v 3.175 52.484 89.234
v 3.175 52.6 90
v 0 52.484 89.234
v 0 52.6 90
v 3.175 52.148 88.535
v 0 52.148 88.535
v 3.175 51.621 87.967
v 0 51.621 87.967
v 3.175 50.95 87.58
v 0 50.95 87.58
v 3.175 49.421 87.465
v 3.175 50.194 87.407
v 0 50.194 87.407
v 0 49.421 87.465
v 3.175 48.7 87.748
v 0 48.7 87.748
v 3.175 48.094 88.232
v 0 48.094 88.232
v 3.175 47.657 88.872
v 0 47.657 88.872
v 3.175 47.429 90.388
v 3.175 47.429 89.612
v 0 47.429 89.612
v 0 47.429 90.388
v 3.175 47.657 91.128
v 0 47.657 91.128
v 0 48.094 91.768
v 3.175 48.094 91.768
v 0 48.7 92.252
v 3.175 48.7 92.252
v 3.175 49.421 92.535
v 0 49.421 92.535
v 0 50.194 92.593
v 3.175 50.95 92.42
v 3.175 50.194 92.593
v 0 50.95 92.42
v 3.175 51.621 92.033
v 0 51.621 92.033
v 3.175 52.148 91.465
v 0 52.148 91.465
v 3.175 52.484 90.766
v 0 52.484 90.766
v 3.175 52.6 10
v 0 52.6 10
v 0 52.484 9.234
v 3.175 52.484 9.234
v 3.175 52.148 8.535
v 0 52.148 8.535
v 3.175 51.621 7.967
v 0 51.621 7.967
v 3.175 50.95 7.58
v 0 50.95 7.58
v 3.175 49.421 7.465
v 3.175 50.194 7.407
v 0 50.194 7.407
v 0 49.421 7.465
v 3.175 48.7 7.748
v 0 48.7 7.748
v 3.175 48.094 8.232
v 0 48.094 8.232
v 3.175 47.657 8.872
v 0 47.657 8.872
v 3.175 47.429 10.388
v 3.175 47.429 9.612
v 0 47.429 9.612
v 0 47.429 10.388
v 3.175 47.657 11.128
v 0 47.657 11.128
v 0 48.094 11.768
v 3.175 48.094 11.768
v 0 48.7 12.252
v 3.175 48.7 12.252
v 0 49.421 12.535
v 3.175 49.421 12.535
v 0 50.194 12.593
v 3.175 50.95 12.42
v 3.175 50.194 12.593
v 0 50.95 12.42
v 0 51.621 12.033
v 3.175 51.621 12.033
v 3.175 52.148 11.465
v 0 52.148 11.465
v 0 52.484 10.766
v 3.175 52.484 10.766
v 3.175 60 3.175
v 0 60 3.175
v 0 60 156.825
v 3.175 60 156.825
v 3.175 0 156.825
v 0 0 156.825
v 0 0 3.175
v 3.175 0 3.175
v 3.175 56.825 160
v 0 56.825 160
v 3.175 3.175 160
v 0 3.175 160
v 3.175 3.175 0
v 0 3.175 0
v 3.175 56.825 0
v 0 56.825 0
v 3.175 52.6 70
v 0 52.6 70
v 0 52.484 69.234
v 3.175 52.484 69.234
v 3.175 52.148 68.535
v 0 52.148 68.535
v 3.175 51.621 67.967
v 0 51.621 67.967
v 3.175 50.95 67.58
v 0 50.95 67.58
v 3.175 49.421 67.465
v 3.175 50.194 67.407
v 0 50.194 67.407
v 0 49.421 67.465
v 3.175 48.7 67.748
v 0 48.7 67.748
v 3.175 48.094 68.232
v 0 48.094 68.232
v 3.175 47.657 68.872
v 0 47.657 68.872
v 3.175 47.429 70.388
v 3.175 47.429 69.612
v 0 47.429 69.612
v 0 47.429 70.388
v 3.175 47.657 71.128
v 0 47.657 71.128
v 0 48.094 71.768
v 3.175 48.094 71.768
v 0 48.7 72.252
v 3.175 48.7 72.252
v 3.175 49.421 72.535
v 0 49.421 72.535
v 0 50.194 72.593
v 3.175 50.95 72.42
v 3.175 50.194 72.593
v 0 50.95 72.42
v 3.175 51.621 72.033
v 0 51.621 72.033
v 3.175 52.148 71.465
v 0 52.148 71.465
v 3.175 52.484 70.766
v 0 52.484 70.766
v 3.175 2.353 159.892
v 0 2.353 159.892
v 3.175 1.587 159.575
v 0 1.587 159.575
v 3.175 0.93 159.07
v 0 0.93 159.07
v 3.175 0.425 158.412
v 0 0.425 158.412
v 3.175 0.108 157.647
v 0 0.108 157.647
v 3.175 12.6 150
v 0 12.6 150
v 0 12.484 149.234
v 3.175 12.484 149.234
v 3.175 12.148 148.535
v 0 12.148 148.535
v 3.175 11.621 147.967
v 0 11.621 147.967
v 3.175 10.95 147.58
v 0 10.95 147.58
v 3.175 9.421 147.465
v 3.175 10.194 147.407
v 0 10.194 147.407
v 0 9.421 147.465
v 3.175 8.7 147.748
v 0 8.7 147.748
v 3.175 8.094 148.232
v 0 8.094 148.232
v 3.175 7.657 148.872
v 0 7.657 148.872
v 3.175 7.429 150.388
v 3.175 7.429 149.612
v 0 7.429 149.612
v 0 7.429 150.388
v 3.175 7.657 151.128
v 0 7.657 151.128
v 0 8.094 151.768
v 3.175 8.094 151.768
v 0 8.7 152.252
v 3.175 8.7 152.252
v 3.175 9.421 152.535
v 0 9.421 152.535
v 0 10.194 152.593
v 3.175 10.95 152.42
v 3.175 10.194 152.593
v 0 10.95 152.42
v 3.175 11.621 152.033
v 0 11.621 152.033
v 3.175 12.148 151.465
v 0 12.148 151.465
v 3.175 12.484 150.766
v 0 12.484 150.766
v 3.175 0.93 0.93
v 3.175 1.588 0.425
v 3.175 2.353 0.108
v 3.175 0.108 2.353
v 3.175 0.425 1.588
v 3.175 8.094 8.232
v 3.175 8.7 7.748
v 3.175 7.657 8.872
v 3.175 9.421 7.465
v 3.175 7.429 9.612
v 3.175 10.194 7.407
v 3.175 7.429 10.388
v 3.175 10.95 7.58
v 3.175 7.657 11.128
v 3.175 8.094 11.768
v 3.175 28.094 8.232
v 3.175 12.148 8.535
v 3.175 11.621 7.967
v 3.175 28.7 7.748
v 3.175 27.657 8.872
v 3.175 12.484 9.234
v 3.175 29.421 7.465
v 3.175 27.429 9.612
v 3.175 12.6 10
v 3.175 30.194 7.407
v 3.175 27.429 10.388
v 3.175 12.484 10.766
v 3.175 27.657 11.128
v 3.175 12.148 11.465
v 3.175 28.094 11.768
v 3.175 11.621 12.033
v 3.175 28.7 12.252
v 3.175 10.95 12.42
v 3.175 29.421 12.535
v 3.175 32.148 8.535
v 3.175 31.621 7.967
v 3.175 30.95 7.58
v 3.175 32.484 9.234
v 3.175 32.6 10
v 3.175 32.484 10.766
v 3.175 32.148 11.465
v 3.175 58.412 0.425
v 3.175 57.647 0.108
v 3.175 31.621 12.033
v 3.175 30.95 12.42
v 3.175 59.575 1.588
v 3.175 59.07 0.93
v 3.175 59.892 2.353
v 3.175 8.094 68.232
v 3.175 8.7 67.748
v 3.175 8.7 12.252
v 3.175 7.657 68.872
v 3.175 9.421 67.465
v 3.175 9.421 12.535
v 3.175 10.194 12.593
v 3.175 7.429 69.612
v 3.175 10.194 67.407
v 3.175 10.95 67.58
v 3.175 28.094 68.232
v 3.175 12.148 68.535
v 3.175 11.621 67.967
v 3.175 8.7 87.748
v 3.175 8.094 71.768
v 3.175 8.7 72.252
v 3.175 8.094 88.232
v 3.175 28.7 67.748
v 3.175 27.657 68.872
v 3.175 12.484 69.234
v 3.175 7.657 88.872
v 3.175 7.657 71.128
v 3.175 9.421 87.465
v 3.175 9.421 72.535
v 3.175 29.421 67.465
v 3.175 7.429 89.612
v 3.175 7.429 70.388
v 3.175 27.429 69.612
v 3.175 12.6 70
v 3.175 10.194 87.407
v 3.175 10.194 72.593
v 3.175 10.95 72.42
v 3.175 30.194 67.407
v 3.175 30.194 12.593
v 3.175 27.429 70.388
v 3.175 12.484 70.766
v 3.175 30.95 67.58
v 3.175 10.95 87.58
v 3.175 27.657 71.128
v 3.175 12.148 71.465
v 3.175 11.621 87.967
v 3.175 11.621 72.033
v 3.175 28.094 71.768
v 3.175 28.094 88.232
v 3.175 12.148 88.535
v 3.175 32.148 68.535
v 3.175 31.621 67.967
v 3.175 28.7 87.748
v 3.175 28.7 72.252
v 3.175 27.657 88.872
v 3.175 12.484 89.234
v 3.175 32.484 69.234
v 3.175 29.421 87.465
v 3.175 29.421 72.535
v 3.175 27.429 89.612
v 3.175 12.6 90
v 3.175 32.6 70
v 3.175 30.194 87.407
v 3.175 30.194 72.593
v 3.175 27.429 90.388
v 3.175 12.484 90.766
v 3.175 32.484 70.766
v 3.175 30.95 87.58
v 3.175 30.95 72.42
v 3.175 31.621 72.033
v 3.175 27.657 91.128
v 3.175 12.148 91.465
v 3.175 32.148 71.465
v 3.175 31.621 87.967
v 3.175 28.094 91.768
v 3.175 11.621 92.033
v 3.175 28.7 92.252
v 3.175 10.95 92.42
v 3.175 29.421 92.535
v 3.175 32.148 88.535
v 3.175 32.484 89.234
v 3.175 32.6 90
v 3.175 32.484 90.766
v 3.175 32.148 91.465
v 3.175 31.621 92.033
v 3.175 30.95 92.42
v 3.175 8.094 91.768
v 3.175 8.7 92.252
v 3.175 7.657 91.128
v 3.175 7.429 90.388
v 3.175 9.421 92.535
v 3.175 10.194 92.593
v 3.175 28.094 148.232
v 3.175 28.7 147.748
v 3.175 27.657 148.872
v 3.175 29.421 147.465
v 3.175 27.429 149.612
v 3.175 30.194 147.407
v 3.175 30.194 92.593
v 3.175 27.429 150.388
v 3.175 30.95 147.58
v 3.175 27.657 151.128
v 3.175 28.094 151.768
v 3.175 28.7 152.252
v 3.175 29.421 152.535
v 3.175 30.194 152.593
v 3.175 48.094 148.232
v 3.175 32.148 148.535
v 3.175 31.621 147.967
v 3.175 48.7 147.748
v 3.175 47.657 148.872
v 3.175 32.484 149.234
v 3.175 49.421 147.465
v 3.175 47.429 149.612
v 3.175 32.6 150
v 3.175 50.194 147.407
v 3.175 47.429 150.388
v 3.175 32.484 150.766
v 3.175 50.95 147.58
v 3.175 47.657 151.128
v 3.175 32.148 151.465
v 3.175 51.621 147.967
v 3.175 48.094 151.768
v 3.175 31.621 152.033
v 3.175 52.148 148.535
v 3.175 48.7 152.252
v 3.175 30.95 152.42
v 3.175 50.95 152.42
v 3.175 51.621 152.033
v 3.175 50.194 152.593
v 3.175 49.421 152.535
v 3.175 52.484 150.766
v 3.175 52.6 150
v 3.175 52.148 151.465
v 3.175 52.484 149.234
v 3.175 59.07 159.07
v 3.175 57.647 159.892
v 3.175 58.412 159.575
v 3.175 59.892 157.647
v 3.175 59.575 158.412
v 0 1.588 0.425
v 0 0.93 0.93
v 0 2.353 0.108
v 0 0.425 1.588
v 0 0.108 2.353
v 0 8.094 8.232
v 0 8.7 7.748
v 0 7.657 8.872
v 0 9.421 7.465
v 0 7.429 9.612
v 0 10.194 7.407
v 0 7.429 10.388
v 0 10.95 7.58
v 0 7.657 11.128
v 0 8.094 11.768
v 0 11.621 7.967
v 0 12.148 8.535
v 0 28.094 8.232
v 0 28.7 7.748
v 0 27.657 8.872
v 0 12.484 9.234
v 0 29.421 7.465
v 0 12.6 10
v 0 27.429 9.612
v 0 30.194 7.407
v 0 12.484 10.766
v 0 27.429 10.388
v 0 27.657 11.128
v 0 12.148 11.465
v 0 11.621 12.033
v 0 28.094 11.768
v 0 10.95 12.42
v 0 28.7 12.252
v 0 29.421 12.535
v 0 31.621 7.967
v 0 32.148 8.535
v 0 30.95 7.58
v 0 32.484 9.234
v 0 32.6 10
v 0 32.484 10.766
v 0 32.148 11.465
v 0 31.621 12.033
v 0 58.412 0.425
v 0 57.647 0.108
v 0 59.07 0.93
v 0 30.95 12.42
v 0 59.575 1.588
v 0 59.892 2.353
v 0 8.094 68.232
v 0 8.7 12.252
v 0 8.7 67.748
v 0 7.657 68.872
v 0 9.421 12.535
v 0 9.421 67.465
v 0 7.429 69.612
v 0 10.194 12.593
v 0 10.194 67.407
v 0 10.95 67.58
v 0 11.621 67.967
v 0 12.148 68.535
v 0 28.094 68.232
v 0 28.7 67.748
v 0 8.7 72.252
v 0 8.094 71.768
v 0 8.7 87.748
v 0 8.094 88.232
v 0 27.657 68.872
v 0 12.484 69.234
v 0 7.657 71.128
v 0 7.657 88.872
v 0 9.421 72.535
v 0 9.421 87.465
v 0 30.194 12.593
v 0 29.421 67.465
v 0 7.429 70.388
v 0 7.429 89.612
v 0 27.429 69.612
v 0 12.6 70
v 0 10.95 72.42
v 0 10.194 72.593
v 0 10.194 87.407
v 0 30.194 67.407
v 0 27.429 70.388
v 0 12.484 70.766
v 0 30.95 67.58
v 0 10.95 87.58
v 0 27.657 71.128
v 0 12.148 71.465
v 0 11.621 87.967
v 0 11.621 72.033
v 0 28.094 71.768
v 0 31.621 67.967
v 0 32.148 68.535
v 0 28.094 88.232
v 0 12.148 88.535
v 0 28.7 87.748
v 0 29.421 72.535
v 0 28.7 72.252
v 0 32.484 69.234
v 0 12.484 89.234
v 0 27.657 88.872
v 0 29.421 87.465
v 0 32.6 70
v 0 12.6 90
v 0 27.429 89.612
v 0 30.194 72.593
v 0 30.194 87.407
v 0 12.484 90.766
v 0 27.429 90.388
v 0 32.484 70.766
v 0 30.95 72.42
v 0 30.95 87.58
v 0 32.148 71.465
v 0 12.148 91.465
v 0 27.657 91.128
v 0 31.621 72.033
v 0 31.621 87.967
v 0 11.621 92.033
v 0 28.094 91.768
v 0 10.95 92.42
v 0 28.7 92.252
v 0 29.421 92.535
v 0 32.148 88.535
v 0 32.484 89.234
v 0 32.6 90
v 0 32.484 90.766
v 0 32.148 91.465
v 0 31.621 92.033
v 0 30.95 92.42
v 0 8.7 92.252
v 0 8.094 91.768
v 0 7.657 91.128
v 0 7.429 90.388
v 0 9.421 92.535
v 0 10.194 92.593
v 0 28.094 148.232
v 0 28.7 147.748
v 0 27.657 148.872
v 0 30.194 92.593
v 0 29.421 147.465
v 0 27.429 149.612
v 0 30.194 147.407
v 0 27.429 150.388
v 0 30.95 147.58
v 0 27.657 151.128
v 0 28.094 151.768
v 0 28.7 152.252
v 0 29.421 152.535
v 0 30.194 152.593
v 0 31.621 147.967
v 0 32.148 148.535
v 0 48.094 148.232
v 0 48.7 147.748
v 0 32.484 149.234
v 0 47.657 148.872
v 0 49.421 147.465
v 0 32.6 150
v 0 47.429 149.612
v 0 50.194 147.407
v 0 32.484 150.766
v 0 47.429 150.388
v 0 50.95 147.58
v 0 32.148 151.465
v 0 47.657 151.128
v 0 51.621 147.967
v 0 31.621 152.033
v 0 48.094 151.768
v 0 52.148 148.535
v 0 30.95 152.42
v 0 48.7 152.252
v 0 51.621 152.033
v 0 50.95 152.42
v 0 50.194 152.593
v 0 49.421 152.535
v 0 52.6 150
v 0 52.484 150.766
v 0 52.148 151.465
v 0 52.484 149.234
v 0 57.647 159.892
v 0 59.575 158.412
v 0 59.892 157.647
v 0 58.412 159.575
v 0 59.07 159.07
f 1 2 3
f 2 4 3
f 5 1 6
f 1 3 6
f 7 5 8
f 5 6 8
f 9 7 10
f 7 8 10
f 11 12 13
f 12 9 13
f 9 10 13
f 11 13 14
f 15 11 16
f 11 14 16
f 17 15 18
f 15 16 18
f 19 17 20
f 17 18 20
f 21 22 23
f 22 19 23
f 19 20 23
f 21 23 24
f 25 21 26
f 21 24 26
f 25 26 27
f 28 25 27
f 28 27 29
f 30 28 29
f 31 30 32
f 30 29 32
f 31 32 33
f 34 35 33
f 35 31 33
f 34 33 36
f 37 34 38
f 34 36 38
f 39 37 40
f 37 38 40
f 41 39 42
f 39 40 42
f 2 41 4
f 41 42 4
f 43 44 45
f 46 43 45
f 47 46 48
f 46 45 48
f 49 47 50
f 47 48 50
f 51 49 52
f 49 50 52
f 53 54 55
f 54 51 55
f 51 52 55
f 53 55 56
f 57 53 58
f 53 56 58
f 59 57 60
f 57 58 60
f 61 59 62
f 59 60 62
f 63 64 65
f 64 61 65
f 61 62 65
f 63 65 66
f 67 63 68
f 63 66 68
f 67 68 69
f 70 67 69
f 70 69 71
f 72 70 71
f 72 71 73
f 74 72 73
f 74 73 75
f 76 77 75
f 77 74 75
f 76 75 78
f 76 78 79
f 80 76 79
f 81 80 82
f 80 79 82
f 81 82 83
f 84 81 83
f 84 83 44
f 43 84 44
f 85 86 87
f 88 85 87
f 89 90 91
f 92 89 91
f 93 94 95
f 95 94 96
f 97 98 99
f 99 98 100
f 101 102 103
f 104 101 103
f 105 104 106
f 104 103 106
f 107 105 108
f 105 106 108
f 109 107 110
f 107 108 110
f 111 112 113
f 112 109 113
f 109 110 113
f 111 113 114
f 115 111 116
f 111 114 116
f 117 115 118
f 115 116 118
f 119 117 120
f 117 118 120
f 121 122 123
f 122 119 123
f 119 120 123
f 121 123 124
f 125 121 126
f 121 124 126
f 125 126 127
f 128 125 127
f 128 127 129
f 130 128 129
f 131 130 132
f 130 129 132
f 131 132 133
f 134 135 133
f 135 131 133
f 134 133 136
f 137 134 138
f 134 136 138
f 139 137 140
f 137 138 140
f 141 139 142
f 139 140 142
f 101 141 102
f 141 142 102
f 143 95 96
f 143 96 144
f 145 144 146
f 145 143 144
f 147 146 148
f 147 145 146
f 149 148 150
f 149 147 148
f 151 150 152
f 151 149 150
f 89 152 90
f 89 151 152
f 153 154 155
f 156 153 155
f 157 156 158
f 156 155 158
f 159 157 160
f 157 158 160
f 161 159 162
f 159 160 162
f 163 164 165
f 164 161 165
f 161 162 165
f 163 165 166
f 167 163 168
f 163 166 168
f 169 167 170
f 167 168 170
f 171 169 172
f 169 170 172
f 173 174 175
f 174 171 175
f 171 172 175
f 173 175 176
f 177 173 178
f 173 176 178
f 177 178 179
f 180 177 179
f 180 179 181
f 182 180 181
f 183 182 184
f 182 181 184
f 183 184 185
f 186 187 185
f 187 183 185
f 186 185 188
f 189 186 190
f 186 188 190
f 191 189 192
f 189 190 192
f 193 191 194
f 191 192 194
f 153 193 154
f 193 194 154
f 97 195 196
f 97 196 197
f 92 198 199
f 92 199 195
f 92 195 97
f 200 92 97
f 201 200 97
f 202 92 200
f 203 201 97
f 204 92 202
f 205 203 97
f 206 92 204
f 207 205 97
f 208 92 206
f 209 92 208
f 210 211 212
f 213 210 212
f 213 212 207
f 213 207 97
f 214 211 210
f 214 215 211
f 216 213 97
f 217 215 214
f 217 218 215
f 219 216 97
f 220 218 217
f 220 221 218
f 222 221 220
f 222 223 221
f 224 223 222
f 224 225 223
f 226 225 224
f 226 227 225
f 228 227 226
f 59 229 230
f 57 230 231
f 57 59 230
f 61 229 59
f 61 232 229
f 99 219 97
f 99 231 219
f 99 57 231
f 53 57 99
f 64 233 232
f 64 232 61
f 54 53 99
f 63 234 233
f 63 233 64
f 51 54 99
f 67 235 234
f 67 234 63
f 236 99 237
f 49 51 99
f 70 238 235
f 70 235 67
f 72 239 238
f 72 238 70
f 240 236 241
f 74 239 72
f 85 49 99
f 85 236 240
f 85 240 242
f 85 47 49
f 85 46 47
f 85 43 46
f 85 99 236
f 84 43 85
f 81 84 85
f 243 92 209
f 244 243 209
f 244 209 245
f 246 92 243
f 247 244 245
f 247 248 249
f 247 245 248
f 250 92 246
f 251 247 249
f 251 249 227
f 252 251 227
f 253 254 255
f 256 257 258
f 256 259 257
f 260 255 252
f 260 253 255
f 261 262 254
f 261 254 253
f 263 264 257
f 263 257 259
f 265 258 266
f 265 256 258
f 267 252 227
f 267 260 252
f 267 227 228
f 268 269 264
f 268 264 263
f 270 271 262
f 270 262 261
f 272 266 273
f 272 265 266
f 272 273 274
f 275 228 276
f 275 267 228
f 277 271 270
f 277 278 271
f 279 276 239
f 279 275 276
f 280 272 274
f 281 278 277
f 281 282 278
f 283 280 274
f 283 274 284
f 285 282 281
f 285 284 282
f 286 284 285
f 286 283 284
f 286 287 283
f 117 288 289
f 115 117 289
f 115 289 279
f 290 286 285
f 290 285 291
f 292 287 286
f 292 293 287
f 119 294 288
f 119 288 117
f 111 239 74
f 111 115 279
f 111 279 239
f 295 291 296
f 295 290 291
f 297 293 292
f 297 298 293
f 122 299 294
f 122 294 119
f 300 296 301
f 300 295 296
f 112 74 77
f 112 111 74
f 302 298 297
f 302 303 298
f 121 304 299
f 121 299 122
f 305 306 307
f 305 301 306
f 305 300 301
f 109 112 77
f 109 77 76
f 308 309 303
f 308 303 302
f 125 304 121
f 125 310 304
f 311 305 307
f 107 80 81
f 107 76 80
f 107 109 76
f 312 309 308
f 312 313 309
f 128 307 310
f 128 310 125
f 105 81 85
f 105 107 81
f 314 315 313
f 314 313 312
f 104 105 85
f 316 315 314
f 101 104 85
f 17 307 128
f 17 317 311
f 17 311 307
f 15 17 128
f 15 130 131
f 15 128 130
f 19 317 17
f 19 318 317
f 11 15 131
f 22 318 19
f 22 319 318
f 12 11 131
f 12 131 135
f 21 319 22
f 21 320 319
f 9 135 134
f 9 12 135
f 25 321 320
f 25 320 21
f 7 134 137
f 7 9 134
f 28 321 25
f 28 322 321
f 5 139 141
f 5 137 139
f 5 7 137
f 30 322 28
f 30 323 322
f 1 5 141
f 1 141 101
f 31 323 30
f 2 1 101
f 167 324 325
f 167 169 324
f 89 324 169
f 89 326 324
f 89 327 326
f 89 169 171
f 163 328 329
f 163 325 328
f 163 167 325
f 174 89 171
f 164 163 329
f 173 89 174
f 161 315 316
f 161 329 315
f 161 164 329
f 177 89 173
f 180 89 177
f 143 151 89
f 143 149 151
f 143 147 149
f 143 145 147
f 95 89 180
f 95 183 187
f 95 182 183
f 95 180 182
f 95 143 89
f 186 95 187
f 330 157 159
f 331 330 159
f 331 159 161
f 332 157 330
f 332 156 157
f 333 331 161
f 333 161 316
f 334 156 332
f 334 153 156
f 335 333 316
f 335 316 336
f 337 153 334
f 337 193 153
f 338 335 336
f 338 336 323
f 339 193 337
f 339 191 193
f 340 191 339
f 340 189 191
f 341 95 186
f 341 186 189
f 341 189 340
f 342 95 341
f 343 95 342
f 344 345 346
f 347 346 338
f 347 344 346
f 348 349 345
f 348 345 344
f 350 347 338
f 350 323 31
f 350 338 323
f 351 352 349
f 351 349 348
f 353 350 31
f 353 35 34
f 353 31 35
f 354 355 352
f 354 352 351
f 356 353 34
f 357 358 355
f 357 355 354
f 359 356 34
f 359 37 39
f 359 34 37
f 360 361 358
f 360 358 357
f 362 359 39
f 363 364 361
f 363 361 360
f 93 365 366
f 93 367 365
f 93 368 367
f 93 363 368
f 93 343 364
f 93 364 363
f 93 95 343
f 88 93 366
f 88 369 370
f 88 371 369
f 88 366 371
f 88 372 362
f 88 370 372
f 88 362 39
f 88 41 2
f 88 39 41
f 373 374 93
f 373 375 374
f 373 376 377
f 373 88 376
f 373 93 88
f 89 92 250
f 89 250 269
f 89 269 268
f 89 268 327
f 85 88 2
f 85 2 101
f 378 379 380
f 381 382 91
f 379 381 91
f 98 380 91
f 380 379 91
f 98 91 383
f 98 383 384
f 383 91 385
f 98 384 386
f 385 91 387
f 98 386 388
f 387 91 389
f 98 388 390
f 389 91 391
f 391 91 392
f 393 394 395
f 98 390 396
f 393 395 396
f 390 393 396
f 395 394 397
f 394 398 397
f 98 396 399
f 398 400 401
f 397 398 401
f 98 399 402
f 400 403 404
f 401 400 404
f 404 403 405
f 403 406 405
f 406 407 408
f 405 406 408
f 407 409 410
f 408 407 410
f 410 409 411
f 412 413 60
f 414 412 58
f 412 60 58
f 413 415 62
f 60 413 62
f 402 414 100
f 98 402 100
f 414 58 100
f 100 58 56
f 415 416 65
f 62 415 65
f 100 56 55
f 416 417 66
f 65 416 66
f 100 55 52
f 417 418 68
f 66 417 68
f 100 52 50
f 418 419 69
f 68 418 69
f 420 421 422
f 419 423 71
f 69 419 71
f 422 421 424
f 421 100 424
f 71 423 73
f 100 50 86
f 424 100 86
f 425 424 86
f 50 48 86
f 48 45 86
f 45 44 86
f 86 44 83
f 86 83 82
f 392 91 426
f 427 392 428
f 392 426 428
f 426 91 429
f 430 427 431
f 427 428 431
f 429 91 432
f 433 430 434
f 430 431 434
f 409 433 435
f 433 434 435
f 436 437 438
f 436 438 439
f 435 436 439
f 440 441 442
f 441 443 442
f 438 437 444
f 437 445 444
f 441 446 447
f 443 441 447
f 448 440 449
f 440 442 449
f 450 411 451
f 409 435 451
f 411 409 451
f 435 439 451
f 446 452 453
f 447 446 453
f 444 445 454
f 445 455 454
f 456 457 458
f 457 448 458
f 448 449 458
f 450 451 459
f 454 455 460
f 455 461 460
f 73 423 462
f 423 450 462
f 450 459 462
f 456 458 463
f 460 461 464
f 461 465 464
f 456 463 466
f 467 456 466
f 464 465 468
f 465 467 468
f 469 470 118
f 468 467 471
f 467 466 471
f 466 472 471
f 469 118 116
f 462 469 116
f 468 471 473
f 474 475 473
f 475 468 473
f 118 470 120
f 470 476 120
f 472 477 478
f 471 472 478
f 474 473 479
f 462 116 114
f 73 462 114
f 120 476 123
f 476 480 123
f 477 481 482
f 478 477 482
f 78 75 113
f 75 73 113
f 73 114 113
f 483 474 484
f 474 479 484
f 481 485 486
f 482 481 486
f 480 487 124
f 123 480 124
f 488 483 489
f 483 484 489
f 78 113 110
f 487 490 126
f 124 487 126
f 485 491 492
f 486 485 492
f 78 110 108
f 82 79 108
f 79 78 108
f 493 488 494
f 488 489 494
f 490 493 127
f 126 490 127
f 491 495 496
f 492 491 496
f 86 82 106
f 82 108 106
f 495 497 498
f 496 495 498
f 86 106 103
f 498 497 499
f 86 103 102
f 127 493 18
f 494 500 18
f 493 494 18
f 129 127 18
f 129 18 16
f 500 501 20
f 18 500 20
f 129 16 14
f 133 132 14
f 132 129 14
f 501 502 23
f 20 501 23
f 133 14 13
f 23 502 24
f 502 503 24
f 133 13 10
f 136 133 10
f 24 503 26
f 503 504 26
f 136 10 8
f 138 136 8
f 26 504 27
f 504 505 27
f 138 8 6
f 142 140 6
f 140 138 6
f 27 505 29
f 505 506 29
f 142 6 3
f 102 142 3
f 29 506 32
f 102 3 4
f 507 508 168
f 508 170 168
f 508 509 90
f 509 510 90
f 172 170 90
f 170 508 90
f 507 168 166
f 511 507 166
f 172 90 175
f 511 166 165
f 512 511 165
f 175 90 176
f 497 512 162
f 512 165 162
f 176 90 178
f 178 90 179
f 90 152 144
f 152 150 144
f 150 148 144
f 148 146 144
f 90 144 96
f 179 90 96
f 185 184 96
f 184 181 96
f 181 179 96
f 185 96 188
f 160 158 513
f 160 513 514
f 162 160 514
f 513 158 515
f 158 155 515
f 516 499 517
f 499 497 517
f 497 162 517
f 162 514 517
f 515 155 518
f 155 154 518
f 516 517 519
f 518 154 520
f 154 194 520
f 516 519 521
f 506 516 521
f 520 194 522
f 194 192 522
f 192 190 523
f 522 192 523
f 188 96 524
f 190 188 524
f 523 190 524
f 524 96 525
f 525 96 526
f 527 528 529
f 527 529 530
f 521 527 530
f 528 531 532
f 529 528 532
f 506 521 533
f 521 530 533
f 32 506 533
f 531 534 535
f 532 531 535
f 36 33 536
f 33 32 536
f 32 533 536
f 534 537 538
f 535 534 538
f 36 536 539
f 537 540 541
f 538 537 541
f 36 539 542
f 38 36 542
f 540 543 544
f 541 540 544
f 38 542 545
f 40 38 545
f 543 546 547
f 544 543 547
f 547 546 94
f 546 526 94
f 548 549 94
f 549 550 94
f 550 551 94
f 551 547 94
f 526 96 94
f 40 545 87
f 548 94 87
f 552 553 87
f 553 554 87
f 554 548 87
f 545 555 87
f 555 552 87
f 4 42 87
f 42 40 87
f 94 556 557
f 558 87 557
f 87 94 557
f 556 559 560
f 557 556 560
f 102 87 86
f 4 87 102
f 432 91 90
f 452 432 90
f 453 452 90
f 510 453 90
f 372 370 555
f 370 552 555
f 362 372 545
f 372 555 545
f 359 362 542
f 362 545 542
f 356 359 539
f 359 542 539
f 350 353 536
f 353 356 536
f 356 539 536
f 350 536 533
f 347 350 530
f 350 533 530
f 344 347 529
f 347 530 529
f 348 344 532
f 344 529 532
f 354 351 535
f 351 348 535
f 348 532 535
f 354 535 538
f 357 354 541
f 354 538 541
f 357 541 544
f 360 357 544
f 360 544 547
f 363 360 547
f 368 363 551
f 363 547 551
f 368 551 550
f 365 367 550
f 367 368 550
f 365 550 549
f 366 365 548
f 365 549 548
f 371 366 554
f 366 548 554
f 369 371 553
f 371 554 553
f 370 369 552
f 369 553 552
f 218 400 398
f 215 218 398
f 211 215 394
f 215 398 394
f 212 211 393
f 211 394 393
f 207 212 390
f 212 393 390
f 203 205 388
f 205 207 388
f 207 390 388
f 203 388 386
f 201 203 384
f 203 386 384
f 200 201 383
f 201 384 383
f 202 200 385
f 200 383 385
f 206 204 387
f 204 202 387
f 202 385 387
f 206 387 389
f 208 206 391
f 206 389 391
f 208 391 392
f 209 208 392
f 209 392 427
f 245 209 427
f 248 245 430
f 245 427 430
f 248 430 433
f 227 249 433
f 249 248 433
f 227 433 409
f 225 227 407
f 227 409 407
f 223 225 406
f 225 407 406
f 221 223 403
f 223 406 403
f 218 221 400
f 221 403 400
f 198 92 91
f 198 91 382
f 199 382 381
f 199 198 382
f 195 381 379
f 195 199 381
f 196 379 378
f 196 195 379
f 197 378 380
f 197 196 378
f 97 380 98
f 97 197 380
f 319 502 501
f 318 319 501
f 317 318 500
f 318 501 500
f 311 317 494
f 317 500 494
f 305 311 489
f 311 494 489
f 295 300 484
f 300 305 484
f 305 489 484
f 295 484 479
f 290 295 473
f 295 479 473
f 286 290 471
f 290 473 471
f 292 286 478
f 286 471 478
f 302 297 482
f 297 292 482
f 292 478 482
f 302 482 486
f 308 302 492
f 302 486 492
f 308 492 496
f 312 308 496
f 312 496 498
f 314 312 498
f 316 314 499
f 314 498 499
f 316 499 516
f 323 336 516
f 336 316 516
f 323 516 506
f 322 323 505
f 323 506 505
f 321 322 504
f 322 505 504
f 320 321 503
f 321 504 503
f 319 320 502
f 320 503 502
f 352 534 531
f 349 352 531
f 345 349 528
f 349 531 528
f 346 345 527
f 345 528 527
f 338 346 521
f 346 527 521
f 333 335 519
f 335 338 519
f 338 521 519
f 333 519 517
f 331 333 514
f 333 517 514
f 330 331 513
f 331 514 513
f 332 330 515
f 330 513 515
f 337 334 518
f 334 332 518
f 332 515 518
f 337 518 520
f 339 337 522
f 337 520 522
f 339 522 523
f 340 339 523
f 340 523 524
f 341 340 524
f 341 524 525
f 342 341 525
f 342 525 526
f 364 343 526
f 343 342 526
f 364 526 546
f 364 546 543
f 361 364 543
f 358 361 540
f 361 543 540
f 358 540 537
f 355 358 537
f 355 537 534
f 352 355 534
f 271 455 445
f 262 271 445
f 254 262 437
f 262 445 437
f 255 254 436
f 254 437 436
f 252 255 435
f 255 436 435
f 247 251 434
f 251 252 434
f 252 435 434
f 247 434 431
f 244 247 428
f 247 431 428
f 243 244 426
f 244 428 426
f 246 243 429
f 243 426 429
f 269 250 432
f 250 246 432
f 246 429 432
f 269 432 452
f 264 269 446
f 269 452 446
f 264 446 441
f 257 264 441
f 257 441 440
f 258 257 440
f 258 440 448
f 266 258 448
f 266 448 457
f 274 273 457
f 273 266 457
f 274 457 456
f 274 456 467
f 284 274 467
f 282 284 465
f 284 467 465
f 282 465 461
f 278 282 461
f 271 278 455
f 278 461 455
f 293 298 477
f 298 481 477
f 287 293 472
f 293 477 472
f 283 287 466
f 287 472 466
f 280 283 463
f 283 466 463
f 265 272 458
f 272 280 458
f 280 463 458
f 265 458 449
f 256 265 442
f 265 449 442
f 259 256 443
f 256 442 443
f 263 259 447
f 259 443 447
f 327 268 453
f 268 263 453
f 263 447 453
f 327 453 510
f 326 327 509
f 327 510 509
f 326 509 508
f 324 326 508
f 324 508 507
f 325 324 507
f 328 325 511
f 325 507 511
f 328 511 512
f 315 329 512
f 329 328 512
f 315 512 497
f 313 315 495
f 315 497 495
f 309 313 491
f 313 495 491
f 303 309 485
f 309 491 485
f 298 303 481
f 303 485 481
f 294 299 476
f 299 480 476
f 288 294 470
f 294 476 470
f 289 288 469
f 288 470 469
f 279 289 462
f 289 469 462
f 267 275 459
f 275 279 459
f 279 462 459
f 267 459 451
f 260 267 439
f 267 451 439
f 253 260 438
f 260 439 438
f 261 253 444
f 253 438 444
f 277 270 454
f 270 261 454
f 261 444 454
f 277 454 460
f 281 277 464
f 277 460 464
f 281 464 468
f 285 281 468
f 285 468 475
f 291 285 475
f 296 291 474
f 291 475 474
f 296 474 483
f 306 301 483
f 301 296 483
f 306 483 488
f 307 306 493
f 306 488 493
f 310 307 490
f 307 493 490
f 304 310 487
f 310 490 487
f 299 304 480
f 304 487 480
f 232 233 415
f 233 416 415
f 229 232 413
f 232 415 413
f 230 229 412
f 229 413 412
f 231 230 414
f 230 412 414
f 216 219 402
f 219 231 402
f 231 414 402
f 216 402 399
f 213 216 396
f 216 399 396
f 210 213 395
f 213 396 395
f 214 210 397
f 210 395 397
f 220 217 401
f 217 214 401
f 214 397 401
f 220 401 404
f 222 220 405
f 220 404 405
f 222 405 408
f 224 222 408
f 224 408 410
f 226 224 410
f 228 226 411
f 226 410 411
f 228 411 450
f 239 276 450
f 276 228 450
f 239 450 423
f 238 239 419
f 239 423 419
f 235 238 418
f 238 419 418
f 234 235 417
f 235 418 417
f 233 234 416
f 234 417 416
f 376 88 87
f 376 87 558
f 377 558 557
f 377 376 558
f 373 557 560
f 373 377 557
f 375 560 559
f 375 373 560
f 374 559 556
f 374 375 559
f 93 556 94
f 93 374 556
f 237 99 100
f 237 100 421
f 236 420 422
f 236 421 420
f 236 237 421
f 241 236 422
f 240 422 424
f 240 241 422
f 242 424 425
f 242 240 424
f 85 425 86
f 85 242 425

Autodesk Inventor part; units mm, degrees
ref_plane "YZ Plane" through (0, 0, 0) normal (1, 0, 0) x (0, 1, 0)
ref_plane "XZ Plane" through (0, 0, 0) normal (0, 1, 0) x (-1, 0, 0)
ref_plane "XY Plane" through (0, 0, 0) normal (0, 0, 1) x (1, 0, 0)
sketch "Sketch1" plane through (0, 0, 0) normal (1, 0, 0) x (0, 1, 0)
  line L0 (0, 0) -> (60, 0)
  line L1 (60, 0) -> (60, 160)
  line L2 (60, 160) -> (0, 160)
  line L3 (0, 160) -> (0, 0)
  line L4 (50, 150) -> (10, 150) construction
  line L5 (10, 150) -> (10, 10) construction
  line L6 (10, 10) -> (50, 10) construction
  line L7 (50, 10) -> (50, 150) construction
  line L8 (50, 80) -> (10, 80) construction
  line L9 (50, 70) -> (10, 70) construction
  line L10 (50, 90) -> (10, 90) construction
  line L11 (30, 150) -> (30, 10) construction
  circle A0 centre (50, 150) radius 2.6
  circle A1 centre (30, 150) radius 2.6
  circle A2 centre (10, 150) radius 2.6
  circle A3 centre (30, 90) radius 2.6
  circle A4 centre (50, 90) radius 2.6
  circle A5 centre (10, 90) radius 2.6
  circle A6 centre (10, 70) radius 2.6
  circle A7 centre (30, 70) radius 2.6
  circle A8 centre (50, 70) radius 2.6
  circle A9 centre (50, 10) radius 2.6
  circle A10 centre (30, 10) radius 2.6
  circle A11 centre (10, 10) radius 2.6
  dimension "d0" = 60
  dimension "d1" = 160
  dimension "d2" = 10
  dimension "d3" = 10
  dimension "d4" = 10
  dimension "d5" = 10
  dimension "d6" = 10
  dimension "d7" = 10
  dimension "d8" = 5.2
  dimension "d9" = 5.2
  dimension "d10" = 5.2
  dimension "d11" = 5.2
  dimension "d12" = 5.2
  dimension "d13" = 5.2
  dimension "d14" = 5.2
  dimension "d15" = 5.2
  dimension "d16" = 5.2
  dimension "d17" = 5.2
  dimension "d18" = 5.2
  dimension "d19" = 5.2
extrude "Extrusion1" add sketch "Sketch1" along normal blind 3.175
fillet "Fillet1" radius 3.175 4 edges at (1.5875, 60, 160) (1.5875, 0, 160) (1.5875, 60, 0) (1.5875, 0, 0)
equation "\"d3\" = d2"
equation "\"d4\" = d2"
equation "\"d5\" = d2"
equation "\"d9\" = d8"
equation "\"d10\" = d8"
equation "\"d11\" = d8"
equation "\"d12\" = d8"
equation "\"d13\" = d8"
equation "\"d14\" = d8"
equation "\"d15\" = d8"
equation "\"d16\" = d8"
equation "\"d17\" = d8"
equation "\"d18\" = d8"
equation "\"d19\" = d8"
properties part number "3x4 2020 Extrusion Gusset Connector"
